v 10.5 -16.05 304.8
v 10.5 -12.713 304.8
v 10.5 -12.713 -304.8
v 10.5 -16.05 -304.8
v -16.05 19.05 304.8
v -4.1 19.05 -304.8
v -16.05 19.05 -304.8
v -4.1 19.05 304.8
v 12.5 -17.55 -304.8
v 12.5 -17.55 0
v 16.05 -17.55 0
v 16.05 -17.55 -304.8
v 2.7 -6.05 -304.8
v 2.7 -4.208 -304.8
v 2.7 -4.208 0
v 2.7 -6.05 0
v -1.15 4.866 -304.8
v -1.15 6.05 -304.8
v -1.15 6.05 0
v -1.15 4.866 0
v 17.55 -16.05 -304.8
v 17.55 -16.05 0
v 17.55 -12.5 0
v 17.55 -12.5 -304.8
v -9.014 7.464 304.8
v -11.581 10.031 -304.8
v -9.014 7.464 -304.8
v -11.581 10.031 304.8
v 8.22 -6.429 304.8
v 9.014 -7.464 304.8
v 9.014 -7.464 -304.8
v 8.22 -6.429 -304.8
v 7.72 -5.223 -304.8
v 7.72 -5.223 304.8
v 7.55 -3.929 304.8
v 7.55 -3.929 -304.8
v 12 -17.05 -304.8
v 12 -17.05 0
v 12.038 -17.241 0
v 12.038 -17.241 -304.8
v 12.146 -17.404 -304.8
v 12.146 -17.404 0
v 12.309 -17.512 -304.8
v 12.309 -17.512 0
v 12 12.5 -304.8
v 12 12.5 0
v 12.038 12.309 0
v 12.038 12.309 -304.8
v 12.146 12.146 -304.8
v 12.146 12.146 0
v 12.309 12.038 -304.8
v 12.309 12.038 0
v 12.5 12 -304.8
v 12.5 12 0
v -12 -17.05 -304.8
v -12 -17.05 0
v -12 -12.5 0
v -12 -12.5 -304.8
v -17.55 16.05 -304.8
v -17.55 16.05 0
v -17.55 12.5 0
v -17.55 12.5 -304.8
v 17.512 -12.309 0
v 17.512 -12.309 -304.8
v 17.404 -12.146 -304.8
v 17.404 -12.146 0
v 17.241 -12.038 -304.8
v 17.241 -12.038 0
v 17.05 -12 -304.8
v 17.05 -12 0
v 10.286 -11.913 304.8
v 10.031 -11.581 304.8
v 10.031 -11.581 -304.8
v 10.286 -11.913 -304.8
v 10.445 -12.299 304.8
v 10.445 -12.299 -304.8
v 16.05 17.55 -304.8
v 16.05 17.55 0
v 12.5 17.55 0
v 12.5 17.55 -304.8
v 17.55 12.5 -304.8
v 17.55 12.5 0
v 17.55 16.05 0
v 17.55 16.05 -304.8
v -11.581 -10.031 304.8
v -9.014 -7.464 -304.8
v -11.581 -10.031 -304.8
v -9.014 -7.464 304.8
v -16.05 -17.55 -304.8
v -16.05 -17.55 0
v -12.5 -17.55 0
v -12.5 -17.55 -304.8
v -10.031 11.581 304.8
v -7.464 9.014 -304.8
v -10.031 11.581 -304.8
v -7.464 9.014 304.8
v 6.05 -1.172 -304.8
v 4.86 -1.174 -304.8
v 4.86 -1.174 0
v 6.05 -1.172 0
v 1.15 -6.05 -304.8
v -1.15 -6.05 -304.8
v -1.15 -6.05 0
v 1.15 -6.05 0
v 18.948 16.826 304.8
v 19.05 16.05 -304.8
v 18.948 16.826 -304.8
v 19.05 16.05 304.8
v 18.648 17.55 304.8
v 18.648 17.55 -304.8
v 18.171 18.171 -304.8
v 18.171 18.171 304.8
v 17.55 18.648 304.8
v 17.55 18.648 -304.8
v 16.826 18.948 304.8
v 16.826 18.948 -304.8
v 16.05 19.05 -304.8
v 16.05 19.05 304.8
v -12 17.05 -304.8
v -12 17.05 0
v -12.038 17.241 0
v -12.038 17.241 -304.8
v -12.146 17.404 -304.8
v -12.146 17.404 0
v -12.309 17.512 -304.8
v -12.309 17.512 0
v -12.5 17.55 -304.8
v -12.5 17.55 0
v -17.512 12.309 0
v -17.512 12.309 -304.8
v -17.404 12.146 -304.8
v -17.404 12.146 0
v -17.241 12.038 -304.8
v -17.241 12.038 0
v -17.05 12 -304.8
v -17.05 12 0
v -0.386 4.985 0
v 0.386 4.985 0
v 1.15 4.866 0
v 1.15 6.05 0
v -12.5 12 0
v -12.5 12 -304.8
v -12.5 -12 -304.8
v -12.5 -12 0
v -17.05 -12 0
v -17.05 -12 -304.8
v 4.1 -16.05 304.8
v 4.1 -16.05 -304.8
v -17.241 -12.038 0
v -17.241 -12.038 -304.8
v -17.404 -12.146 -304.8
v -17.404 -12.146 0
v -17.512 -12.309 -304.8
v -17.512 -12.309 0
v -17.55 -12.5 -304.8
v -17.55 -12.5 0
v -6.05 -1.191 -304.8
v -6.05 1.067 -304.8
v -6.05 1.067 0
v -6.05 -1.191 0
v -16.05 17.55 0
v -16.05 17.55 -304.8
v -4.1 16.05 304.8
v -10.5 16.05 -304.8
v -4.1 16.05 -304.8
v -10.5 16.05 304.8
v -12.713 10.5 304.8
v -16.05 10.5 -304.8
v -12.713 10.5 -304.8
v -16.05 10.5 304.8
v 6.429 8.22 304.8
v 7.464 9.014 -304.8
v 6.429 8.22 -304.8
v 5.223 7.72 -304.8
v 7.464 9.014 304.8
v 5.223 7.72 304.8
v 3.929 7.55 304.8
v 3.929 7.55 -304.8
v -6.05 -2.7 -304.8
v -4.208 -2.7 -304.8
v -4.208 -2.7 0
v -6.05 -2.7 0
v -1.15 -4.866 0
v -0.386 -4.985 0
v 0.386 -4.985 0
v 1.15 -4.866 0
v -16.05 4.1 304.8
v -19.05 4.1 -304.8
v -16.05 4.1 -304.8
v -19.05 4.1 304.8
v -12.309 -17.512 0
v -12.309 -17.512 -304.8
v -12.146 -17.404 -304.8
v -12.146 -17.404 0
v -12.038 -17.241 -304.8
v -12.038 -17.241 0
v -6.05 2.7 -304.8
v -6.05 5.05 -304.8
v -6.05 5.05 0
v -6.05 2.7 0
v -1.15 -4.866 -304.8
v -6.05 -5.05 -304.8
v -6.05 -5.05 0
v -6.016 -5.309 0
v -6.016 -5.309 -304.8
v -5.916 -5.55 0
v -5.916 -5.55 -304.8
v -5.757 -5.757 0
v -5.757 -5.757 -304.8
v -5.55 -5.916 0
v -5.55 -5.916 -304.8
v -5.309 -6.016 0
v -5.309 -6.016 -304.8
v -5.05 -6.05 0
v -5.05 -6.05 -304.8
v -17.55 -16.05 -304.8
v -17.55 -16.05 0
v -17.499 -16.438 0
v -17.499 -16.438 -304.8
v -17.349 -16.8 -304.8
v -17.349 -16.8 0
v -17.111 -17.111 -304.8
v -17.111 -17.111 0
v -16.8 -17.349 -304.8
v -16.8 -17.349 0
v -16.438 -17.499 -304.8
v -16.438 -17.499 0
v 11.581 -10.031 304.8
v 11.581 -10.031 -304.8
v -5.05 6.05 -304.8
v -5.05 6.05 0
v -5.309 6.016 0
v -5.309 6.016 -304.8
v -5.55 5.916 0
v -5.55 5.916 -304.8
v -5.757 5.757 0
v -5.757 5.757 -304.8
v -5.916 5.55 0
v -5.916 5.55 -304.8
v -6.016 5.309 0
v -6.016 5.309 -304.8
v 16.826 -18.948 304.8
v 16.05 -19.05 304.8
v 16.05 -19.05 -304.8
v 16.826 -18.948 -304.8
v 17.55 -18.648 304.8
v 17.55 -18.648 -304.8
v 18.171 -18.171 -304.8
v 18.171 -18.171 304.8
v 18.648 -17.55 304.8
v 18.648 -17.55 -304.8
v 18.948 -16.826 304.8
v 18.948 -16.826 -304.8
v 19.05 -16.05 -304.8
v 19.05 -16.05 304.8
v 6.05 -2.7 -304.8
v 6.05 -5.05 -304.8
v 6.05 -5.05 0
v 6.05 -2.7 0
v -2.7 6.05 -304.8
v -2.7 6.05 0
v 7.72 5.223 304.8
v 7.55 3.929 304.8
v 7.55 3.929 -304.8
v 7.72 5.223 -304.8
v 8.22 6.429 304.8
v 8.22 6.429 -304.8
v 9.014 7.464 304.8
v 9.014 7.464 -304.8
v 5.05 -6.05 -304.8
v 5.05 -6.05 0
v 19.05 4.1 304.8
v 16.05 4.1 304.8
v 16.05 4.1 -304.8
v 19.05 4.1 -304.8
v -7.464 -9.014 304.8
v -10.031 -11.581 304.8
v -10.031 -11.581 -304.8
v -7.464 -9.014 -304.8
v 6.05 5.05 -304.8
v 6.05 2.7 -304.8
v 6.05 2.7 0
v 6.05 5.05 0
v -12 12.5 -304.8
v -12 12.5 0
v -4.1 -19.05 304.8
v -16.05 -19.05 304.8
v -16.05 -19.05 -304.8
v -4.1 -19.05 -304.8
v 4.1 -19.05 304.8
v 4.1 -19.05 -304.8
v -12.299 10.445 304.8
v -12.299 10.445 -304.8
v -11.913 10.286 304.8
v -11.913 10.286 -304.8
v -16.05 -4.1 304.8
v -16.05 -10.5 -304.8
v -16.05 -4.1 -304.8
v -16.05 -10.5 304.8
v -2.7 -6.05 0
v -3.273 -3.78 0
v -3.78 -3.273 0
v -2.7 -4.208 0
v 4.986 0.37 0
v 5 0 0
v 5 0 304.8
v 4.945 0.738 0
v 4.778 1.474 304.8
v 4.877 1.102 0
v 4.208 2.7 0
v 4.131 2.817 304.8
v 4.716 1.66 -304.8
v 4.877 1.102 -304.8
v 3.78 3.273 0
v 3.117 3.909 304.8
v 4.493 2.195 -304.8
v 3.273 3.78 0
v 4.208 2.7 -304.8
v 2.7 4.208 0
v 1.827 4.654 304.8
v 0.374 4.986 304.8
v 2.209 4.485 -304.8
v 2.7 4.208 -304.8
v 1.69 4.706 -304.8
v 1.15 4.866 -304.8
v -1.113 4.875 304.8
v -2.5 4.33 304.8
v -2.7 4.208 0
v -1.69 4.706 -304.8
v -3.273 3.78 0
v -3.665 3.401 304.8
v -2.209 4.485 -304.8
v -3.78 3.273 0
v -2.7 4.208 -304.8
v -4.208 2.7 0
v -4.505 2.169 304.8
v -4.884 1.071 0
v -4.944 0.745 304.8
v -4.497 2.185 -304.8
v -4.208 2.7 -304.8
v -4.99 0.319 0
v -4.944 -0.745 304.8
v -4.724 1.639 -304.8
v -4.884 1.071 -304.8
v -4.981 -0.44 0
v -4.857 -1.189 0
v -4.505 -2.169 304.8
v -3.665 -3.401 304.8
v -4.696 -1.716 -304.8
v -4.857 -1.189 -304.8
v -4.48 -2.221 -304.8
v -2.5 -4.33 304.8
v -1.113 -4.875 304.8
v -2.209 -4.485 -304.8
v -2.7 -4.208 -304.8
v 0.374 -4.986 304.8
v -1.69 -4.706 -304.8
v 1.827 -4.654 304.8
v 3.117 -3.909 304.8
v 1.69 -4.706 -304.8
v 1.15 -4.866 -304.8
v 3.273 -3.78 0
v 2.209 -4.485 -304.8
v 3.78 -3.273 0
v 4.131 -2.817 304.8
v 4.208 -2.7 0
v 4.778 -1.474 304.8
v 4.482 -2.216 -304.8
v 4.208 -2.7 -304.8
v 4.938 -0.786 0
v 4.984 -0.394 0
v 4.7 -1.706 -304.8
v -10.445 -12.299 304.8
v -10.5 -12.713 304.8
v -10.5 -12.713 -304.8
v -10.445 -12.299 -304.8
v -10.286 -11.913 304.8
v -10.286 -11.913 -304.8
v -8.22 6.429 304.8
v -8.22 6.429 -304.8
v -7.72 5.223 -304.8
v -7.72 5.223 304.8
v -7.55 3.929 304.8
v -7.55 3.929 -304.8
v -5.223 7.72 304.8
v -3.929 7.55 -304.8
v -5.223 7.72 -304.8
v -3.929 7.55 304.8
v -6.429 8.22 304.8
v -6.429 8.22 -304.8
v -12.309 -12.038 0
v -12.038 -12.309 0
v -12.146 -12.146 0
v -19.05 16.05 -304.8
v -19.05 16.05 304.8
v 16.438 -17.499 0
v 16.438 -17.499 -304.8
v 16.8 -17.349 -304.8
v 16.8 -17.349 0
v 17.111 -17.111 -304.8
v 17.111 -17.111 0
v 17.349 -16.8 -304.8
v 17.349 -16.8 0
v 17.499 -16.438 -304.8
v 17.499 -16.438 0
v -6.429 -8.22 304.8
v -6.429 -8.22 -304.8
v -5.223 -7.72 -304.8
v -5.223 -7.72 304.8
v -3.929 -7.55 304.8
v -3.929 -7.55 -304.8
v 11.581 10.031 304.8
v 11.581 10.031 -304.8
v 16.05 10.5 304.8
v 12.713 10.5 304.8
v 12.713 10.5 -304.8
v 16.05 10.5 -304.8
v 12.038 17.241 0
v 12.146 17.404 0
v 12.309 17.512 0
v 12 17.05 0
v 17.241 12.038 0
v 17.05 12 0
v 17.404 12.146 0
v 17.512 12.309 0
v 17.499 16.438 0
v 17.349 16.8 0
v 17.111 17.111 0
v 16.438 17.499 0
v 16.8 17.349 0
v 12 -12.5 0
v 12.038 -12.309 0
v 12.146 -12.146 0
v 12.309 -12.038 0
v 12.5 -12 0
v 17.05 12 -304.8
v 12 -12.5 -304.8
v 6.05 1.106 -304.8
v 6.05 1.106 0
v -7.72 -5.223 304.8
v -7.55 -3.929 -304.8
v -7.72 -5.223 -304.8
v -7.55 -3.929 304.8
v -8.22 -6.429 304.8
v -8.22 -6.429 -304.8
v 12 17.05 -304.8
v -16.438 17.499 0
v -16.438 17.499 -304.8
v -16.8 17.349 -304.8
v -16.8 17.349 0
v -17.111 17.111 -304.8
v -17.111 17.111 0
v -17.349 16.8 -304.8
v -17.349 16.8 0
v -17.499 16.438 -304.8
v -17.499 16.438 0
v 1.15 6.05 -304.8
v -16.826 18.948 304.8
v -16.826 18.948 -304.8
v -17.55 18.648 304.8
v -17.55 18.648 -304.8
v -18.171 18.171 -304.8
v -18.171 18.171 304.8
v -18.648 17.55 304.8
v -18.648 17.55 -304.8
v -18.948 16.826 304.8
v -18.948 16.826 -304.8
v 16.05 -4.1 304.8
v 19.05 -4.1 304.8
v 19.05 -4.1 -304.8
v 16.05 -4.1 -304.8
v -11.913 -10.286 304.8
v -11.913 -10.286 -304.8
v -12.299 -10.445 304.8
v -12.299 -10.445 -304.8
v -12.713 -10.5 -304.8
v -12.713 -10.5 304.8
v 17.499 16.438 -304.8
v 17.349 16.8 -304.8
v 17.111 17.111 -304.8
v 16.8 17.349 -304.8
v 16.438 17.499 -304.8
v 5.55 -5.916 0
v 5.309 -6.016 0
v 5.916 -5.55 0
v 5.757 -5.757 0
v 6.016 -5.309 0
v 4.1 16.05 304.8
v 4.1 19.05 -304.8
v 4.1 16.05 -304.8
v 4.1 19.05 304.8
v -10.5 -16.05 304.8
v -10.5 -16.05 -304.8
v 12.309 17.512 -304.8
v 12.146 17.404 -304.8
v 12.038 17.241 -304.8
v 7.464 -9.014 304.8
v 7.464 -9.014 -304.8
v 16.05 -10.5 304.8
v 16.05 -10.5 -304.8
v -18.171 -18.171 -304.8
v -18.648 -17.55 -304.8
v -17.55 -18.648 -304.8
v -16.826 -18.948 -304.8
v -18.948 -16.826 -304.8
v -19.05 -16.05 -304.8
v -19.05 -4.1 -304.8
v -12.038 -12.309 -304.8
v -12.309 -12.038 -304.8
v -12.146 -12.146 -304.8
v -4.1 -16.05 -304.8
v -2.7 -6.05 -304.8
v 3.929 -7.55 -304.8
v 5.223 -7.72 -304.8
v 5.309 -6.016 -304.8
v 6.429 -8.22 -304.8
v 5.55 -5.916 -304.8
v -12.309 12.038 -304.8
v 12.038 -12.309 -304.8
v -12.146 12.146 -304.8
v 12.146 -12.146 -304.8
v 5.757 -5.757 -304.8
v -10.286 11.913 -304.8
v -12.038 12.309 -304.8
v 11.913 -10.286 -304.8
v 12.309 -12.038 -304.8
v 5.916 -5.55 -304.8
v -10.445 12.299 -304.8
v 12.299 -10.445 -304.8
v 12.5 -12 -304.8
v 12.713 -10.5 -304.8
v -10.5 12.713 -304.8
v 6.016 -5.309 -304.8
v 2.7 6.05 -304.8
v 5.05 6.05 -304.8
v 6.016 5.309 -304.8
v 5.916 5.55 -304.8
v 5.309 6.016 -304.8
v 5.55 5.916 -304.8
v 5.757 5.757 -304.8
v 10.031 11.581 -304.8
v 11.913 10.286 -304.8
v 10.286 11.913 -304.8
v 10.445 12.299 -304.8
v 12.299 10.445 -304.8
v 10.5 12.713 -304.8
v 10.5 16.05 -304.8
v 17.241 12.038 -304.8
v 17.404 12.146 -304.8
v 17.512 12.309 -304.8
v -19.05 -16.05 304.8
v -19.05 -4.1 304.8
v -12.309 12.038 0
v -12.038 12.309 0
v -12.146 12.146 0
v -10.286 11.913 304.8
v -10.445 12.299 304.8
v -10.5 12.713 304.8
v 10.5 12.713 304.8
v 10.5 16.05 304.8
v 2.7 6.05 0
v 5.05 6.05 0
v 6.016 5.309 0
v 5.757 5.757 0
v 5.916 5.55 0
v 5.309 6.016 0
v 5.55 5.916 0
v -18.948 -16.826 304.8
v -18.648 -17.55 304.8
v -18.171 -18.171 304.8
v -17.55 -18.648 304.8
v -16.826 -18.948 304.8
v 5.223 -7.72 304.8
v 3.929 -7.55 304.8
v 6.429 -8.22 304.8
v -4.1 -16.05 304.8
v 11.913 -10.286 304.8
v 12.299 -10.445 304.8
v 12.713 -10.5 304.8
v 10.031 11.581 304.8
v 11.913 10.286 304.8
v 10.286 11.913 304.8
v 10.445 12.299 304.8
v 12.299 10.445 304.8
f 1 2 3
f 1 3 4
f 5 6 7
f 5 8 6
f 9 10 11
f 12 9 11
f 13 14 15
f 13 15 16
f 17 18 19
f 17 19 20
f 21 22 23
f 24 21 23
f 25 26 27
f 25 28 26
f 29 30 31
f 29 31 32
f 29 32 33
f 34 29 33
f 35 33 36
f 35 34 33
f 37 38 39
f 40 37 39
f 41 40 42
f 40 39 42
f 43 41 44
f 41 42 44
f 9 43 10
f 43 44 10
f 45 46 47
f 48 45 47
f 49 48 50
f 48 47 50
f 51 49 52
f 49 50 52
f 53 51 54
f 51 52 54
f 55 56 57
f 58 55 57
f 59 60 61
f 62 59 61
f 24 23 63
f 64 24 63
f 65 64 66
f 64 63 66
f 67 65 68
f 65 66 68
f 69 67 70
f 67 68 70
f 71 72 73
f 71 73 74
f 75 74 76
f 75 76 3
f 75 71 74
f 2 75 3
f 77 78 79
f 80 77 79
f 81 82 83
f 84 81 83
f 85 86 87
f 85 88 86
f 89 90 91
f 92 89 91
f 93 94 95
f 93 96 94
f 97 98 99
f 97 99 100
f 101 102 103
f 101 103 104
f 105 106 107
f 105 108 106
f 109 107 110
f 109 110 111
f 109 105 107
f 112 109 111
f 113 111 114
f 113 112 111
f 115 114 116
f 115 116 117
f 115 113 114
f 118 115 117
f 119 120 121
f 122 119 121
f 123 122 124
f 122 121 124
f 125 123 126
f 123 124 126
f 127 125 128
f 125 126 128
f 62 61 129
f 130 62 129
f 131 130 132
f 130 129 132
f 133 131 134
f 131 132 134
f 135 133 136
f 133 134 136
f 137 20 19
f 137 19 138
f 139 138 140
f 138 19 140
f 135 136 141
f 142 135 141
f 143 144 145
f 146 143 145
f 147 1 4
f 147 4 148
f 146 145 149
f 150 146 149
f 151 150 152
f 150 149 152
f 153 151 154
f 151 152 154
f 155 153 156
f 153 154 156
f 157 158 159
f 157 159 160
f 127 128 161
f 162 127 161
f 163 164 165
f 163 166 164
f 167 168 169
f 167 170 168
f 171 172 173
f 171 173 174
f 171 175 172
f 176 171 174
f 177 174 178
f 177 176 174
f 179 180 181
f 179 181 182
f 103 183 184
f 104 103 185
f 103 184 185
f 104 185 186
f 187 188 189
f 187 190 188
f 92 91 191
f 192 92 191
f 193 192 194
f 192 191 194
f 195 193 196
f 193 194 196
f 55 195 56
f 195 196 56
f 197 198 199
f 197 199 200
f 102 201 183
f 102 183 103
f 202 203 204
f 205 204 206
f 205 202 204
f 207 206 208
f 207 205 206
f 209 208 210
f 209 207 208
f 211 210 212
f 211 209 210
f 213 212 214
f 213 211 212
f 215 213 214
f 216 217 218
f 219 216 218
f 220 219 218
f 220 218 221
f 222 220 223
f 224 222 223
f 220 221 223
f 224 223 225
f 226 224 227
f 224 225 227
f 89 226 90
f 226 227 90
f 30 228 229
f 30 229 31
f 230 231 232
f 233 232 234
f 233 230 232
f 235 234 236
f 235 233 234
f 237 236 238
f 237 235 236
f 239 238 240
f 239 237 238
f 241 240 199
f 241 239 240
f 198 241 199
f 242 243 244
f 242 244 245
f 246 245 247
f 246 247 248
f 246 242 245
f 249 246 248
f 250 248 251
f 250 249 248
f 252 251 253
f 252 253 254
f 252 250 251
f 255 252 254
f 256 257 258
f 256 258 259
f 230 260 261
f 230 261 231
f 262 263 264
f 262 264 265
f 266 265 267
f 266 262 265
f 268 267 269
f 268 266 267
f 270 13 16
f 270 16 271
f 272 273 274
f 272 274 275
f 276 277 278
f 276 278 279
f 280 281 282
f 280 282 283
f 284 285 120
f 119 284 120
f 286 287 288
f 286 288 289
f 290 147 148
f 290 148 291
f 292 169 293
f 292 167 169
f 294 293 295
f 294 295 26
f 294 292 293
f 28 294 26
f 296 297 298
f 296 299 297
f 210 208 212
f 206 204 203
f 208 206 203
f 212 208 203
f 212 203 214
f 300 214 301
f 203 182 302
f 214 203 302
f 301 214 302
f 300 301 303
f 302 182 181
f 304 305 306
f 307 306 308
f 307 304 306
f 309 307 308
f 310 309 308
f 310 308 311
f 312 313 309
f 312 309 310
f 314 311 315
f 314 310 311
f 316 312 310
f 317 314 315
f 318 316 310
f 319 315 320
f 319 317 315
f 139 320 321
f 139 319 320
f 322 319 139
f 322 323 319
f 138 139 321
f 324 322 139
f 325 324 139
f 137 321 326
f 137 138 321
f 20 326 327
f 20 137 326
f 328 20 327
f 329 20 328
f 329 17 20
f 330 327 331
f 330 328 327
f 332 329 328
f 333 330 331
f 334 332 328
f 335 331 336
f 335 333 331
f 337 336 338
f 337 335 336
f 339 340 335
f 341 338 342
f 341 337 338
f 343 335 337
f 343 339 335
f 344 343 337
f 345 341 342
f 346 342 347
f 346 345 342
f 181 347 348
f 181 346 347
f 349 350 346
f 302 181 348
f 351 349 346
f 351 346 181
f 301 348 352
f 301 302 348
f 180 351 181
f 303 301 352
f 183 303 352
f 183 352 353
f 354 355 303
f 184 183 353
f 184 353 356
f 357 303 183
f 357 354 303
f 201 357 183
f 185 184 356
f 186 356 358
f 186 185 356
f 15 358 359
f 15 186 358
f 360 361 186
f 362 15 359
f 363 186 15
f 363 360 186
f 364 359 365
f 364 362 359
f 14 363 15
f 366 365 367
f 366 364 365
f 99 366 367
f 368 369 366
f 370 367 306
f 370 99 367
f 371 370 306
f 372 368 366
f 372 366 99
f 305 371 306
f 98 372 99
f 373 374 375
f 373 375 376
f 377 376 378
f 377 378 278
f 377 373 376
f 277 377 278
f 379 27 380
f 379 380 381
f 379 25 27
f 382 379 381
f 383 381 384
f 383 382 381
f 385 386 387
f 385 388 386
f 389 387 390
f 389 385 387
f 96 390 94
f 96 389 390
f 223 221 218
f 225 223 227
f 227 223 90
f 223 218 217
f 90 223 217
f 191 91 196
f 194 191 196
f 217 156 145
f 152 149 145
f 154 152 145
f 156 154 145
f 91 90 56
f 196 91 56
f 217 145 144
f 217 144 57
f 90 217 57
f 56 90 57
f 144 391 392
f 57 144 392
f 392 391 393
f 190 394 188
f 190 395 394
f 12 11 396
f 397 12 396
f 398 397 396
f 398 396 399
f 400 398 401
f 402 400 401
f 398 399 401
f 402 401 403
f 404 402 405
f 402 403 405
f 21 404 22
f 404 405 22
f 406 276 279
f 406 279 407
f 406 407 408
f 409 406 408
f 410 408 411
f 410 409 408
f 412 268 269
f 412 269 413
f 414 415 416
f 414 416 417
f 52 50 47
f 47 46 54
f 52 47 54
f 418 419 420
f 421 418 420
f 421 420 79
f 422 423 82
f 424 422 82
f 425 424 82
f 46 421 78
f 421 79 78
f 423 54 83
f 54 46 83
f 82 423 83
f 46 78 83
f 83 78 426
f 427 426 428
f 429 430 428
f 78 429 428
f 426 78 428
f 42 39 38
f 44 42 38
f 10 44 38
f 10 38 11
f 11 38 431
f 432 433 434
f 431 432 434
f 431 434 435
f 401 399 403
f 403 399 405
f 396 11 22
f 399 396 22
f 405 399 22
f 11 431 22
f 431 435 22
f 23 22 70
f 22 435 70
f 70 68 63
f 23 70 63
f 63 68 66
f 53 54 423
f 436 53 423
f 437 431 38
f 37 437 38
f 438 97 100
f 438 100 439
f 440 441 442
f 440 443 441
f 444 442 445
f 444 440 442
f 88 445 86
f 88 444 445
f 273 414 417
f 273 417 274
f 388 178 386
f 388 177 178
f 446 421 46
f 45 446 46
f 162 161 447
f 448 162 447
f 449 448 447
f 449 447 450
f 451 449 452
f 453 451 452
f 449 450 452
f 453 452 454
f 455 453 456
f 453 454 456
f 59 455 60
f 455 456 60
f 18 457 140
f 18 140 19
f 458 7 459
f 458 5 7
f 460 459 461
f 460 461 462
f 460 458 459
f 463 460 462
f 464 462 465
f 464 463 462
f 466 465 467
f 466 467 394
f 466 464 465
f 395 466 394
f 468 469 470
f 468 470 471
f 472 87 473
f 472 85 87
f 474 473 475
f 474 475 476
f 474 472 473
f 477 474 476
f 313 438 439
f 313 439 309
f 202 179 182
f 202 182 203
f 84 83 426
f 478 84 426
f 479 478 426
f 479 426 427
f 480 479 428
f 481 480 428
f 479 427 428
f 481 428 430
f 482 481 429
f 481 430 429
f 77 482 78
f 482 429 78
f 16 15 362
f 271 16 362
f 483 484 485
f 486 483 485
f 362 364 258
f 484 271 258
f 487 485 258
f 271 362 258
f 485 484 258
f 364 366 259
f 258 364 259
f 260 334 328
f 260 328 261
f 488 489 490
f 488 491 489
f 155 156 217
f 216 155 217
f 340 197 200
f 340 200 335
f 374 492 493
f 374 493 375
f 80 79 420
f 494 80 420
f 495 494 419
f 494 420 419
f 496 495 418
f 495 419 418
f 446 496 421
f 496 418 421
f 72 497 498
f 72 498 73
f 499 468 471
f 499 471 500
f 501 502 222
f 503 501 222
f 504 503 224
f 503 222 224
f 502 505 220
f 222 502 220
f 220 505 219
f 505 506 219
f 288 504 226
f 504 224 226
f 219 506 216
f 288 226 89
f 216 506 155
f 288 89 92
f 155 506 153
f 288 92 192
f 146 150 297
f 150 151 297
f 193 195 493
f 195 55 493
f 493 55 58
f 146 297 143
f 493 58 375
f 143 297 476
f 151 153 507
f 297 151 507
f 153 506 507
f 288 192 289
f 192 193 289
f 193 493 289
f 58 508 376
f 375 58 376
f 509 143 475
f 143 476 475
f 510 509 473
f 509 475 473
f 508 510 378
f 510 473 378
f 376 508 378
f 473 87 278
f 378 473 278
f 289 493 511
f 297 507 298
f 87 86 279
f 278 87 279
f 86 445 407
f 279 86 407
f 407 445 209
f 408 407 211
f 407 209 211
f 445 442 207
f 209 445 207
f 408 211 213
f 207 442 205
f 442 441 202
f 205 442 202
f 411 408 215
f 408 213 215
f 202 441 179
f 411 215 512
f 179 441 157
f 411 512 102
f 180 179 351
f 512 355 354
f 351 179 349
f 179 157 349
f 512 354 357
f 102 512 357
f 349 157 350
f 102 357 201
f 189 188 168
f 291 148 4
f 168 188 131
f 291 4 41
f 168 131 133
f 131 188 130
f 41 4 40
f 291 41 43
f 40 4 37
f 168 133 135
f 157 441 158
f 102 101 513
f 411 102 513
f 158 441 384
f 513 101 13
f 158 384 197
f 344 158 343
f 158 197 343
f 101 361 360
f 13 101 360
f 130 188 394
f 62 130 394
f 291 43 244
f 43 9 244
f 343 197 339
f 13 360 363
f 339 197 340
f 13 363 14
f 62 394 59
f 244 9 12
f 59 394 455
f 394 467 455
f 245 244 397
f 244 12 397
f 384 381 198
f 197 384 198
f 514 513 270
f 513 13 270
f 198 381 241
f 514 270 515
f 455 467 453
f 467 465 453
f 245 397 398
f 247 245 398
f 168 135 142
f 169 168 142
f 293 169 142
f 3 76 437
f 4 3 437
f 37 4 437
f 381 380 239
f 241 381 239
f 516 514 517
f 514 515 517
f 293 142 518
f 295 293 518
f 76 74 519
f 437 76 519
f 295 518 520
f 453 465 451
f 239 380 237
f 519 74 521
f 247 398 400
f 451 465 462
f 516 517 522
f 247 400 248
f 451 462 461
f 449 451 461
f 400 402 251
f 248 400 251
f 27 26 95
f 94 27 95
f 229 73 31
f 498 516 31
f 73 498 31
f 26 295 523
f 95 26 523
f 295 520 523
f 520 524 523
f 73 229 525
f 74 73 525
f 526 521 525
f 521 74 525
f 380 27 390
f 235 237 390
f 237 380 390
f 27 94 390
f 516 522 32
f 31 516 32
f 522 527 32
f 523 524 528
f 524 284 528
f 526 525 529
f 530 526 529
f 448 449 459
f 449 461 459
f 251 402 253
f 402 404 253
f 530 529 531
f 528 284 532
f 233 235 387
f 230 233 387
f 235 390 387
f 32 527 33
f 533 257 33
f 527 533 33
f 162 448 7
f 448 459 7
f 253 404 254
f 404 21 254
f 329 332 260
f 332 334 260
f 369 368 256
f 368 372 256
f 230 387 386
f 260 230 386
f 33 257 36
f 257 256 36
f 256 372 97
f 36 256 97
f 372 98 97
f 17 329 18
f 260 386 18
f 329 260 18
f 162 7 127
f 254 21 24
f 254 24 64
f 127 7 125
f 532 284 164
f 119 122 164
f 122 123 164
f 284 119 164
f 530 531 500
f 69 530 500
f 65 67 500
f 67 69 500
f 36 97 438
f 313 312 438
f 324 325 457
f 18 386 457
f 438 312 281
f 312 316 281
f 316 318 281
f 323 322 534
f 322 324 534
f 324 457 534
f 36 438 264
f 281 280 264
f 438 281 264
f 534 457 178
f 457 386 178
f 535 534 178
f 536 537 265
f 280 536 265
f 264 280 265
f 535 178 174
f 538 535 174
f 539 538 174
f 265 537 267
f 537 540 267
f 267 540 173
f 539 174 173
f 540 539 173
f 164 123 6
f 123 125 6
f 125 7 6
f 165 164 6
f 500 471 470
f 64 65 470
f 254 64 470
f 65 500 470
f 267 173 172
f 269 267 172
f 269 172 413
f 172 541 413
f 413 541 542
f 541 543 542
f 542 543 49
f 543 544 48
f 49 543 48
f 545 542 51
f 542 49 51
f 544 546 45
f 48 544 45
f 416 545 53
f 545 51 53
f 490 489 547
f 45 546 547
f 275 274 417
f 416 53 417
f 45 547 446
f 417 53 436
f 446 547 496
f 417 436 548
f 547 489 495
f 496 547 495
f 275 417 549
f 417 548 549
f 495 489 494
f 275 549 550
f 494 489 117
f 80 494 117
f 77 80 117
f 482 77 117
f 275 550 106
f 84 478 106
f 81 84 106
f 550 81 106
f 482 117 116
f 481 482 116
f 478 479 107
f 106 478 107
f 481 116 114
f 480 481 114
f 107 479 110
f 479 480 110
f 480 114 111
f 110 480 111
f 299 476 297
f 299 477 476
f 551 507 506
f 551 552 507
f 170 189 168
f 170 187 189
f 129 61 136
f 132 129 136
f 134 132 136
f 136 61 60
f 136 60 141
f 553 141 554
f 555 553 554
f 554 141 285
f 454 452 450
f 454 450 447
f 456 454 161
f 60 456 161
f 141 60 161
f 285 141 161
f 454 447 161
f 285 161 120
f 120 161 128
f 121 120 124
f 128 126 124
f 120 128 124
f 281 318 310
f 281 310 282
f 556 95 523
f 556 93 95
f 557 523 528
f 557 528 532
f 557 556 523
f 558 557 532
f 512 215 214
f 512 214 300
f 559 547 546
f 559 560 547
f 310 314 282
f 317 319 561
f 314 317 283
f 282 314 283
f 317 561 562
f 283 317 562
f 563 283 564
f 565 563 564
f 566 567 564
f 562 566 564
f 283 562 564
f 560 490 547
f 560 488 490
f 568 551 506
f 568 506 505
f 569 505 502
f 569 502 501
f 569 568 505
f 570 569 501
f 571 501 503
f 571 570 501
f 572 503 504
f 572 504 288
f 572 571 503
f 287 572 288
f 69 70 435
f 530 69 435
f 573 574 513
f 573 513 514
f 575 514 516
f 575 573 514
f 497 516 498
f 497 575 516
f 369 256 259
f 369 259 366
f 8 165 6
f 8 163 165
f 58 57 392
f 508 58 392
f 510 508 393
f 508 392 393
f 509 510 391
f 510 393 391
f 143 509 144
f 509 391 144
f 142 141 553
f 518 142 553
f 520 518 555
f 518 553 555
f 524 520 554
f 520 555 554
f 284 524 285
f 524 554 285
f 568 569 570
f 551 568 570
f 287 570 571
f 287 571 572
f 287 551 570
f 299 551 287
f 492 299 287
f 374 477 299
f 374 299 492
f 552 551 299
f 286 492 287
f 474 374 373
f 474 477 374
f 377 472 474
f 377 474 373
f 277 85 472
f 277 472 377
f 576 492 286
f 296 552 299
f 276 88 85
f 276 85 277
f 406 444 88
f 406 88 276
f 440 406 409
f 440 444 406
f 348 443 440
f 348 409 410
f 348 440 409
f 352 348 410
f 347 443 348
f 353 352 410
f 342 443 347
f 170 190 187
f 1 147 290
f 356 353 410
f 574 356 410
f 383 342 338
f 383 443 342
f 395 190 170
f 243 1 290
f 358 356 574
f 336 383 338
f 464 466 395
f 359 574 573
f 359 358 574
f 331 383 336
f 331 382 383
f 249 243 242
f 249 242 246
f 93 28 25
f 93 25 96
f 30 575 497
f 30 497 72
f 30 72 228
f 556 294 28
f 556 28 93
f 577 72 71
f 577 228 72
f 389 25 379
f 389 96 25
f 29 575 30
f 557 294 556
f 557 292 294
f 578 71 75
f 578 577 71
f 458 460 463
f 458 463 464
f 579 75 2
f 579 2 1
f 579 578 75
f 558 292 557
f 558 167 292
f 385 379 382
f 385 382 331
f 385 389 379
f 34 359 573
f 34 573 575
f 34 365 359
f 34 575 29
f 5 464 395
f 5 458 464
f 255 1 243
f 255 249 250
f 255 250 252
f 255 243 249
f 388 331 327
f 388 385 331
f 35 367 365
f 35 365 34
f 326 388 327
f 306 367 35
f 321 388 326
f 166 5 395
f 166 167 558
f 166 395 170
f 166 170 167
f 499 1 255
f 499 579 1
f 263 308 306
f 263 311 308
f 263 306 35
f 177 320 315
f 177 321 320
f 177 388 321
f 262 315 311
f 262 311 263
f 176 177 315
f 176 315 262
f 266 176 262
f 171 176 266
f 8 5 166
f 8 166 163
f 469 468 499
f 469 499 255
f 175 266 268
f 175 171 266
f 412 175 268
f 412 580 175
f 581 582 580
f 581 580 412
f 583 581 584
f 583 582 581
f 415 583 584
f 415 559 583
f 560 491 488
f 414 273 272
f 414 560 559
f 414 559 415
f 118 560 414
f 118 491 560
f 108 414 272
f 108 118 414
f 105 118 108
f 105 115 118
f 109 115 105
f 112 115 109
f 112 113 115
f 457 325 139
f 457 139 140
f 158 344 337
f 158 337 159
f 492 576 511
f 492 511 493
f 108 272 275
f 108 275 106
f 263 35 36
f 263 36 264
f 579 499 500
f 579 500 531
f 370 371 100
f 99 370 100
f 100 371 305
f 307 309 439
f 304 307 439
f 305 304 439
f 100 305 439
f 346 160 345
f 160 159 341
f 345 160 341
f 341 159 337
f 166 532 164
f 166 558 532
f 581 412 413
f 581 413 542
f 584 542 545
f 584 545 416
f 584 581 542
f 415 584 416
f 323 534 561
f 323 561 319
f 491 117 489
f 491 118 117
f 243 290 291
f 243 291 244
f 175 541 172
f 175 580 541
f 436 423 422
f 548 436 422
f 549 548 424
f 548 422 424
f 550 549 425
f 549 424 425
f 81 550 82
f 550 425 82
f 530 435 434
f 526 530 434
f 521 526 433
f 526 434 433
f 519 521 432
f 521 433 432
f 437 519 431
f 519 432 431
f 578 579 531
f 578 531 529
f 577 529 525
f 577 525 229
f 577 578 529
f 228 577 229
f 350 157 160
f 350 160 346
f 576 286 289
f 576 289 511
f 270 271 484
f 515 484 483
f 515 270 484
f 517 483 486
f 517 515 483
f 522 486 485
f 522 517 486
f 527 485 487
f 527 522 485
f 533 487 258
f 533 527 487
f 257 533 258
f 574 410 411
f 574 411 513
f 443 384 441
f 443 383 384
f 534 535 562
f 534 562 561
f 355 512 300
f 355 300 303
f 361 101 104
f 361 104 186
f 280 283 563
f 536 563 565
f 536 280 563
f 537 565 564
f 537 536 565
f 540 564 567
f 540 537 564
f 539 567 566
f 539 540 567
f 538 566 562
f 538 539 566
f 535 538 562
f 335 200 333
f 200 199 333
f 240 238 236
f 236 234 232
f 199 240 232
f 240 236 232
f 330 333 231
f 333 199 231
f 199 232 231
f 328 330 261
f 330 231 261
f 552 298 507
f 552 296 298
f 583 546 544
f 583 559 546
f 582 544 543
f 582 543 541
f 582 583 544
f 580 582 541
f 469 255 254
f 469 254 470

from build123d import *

# Parameters (mm, degrees)
SKETCH1_R           = 5
BOSS_EXTRUDE1_DEPTH = 304.8
CUT_EXTRUDE1_DEPTH  = 6000
CUT_EXTRUDE2_DEPTH  = 6000
CUT_EXTRUDE3_START  = -6000
CUT_EXTRUDE3_DEPTH  = 6000
CUT_EXTRUDE4_DEPTH  = 6000
CUT_EXTRUDE5_DEPTH  = 6000


with BuildPart() as part:
    # Sketch1 → Boss-Extrude1 (new, symmetric)
    with BuildSketch(Plane.XY):
        with BuildLine():
            Line((-19.05, -4.1), (-19.05, -16.05))
            ThreePointArc((-19.05, -16.05), (-18.171320344, -18.171320344), (-16.05, -19.05))
            Line((-16.05, -19.05), (-4.1, -19.05))
            Line((-4.1, -19.05), (-4.1, -16.05))
            Line((-4.1, -16.05), (-10.5, -16.05))
            Line((-10.5, -16.05), (-10.5, -12.7127))
            ThreePointArc((-10.5, -12.7127), (-10.378208373, -12.100409218), (-10.03135, -11.58135))
            Line((-10.03135, -11.58135), (-7.464465, -9.014465))
            ThreePointArc((-7.464465, -9.014465), (-5.842347304, -7.930602396), (-3.92893, -7.55))
            Line((-3.92893, -7.55), (3.92893, -7.55))
            ThreePointArc((3.92893, -7.55), (5.842347304, -7.930602396), (7.464465, -9.014465))
            Line((7.464465, -9.014465), (10.03135, -11.58135))
            ThreePointArc((10.03135, -11.58135), (10.378208373, -12.100409218), (10.5, -12.7127))
            Line((10.5, -12.7127), (10.5, -16.05))
            Line((10.5, -16.05), (4.1, -16.05))
            Line((4.1, -16.05), (4.1, -19.05))
            Line((4.1, -19.05), (16.05, -19.05))
            ThreePointArc((16.05, -19.05), (18.171320344, -18.171320344), (19.05, -16.05))
            Line((19.05, -16.05), (19.05, -4.1))
            Line((19.05, -4.1), (16.05, -4.1))
            Line((16.05, -4.1), (16.05, -10.5))
            Line((16.05, -10.5), (12.7127, -10.5))
            ThreePointArc((12.7127, -10.5), (12.100409218, -10.378208373), (11.58135, -10.03135))
            Line((11.58135, -10.03135), (9.014465, -7.464465))
            ThreePointArc((9.014465, -7.464465), (7.930602396, -5.842347304), (7.55, -3.92893))
            Line((7.55, -3.92893), (7.55, 3.92893))
            ThreePointArc((7.55, 3.92893), (7.930602396, 5.842347304), (9.014465, 7.464465))
            Line((9.014465, 7.464465), (11.58135, 10.03135))
            ThreePointArc((11.58135, 10.03135), (12.100409218, 10.378208373), (12.7127, 10.5))
            Line((12.7127, 10.5), (16.05, 10.5))
            Line((16.05, 10.5), (16.05, 4.1))
            Line((16.05, 4.1), (19.05, 4.1))
            Line((19.05, 4.1), (19.05, 16.05))
            ThreePointArc((19.05, 16.05), (18.171320344, 18.171320344), (16.05, 19.05))
            Line((16.05, 19.05), (4.1, 19.05))
            Line((4.1, 19.05), (4.1, 16.05))
            Line((4.1, 16.05), (10.5, 16.05))
            Line((10.5, 16.05), (10.5, 12.7127))
            ThreePointArc((10.5, 12.7127), (10.378208373, 12.100409218), (10.03135, 11.58135))
            Line((10.03135, 11.58135), (7.464465, 9.014465))
            ThreePointArc((7.464465, 9.014465), (5.842347304, 7.930602396), (3.92893, 7.55))
            Line((3.92893, 7.55), (-3.92893, 7.55))
            ThreePointArc((-3.92893, 7.55), (-5.842347304, 7.930602396), (-7.464465, 9.014465))
            Line((-7.464465, 9.014465), (-10.03135, 11.58135))
            ThreePointArc((-10.03135, 11.58135), (-10.378208373, 12.100409218), (-10.5, 12.7127))
            Line((-10.5, 12.7127), (-10.5, 16.05))
            Line((-10.5, 16.05), (-4.1, 16.05))
            Line((-4.1, 16.05), (-4.1, 19.05))
            Line((-4.1, 19.05), (-16.05, 19.05))
            ThreePointArc((-16.05, 19.05), (-18.171320344, 18.171320344), (-19.05, 16.05))
            Line((-19.05, 16.05), (-19.05, 4.1))
            Line((-19.05, 4.1), (-16.05, 4.1))
            Line((-16.05, 4.1), (-16.05, 10.5))
            Line((-16.05, 10.5), (-12.7127, 10.5))
            ThreePointArc((-12.7127, 10.5), (-12.100409218, 10.378208373), (-11.58135, 10.03135))
            Line((-11.58135, 10.03135), (-9.014465, 7.464465))
            ThreePointArc((-9.014465, 7.464465), (-7.930602396, 5.842347304), (-7.55, 3.92893))
            Line((-7.55, 3.92893), (-7.55, -3.92893))
            ThreePointArc((-7.55, -3.92893), (-7.930602396, -5.842347304), (-9.014465, -7.464465))
            Line((-9.014465, -7.464465), (-11.58135, -10.03135))
            ThreePointArc((-11.58135, -10.03135), (-12.100409218, -10.378208373), (-12.7127, -10.5))
            Line((-12.7127, -10.5), (-16.05, -10.5))
            Line((-16.05, -10.5), (-16.05, -4.1))
            Line((-16.05, -4.1), (-19.05, -4.1))
        make_face()
        Circle(SKETCH1_R, mode=Mode.SUBTRACT)
    extrude(amount=BOSS_EXTRUDE1_DEPTH, both=True)

    # Sketch2 → Cut-Extrude1 (cut)
    with BuildSketch(Plane.XY):
        with BuildLine():
            Line((-17.55, -12.5), (-17.55, -16.05))
            ThreePointArc((-17.55, -16.05), (-17.110660172, -17.110660172), (-16.05, -17.55))
            Line((-16.05, -17.55), (-12.5, -17.55))
            ThreePointArc((-12.5, -17.55), (-12.146446609, -17.403553391), (-12, -17.05))
            Line((-12, -17.05), (-12, -12.5))
            ThreePointArc((-12, -12.5), (-12.146446609, -12.146446609), (-12.5, -12))
            Line((-12.5, -12), (-17.05, -12))
            ThreePointArc((-17.05, -12), (-17.403553391, -12.146446609), (-17.55, -12.5))
        make_face()
    extrude(amount=-CUT_EXTRUDE1_DEPTH, mode=Mode.SUBTRACT)

    # Sketch3 → Cut-Extrude2 (cut)
    with BuildSketch(Plane.XY):
        with BuildLine():
            Line((12.5, -17.55), (16.05, -17.55))
            ThreePointArc((16.05, -17.55), (17.110660172, -17.110660172), (17.55, -16.05))
            Line((17.55, -16.05), (17.55, -12.5))
            ThreePointArc((17.55, -12.5), (17.403553391, -12.146446609), (17.05, -12))
            Line((17.05, -12), (12.5, -12))
            ThreePointArc((12.5, -12), (12.146446609, -12.146446609), (12, -12.5))
            Line((12, -12.5), (12, -17.05))
            ThreePointArc((12, -17.05), (12.146446609, -17.403553391), (12.5, -17.55))
        make_face()
    extrude(amount=-CUT_EXTRUDE2_DEPTH, mode=Mode.SUBTRACT)

    # Sketch4 → Cut-Extrude3 (cut)
    with BuildSketch(Plane.XY.offset(CUT_EXTRUDE3_START)):
        with BuildLine():
            Line((-6.05, 1.06724), (-6.05, -1.19102))
            Line((-6.05, -1.19102), (-4.85654377, -1.189110006))
            ThreePointArc((-4.85654377, -1.189110006), (-4.594960171, -1.971380488), (-4.208325083, -2.7))
            Line((-4.208325083, -2.7), (-6.05, -2.7))
            Line((-6.05, -2.7), (-6.05, -5.05))
            ThreePointArc((-6.05, -5.05), (-5.757106781, -5.757106781), (-5.05, -6.05))
            Line((-5.05, -6.05), (-2.7, -6.05))
            Line((-2.7, -6.05), (-2.7, -4.208325083))
            ThreePointArc((-2.7, -4.208325083), (-1.952880863, -4.602853064), (-1.15, -4.865953144))
            Line((-1.15, -4.865953144), (-1.15, -6.05))
            Line((-1.15, -6.05), (1.15, -6.05))
            Line((1.15, -6.05), (1.15, -4.865953144))
            ThreePointArc((1.15, -4.865953144), (1.952880863, -4.602853064), (2.7, -4.208325083))
            Line((2.7, -4.208325083), (2.7, -6.05))
            Line((2.7, -6.05), (5.05, -6.05))
            ThreePointArc((5.05, -6.05), (5.757106781, -5.757106781), (6.05, -5.05))
            Line((6.05, -5.05), (6.05, -2.7))
            Line((6.05, -2.7), (4.208325083, -2.7))
            ThreePointArc((4.208325083, -2.7), (4.598107084, -1.964029338), (4.860322362, -1.173569996))
            Line((4.860322362, -1.173569996), (6.05, -1.17167))
            Line((6.05, -1.17167), (6.05, 1.10628))
            Line((6.05, 1.10628), (4.876934876, 1.102499983))
            ThreePointArc((4.876934876, 1.102499983), (4.612319233, 1.930417389), (4.208325083, 2.7))
            Line((4.208325083, 2.7), (6.05, 2.7))
            Line((6.05, 2.7), (6.05, 5.05))
            ThreePointArc((6.05, 5.05), (5.757106781, 5.757106781), (5.05, 6.05))
            Line((5.05, 6.05), (2.7, 6.05))
            Line((2.7, 6.05), (2.7, 4.208325083))
            ThreePointArc((2.7, 4.208325083), (1.952880863, 4.602853064), (1.15, 4.865953144))
            Line((1.15, 4.865953144), (1.15, 6.05))
            Line((1.15, 6.05), (-1.15, 6.05))
            Line((-1.15, 6.05), (-1.15, 4.865953144))
            ThreePointArc((-1.15, 4.865953144), (-1.952880863, 4.602853064), (-2.7, 4.208325083))
            Line((-2.7, 4.208325083), (-2.7, 6.05))
            Line((-2.7, 6.05), (-5.05, 6.05))
            ThreePointArc((-5.05, 6.05), (-5.757106781, 5.757106781), (-6.05, 5.05))
            Line((-6.05, 5.05), (-6.05, 2.7))
            Line((-6.05, 2.7), (-4.208325083, 2.7))
            ThreePointArc((-4.208325083, 2.7), (-4.618524958, 1.9155227), (-4.883949119, 1.071000003))
            Line((-4.883949119, 1.071000003), (-6.05, 1.06724))
        make_face()
    extrude(amount=CUT_EXTRUDE3_DEPTH, mode=Mode.SUBTRACT)

    # Sketch5 → Cut-Extrude4 (cut)
    with BuildSketch(Plane.XY):
        with BuildLine():
            Line((12, 17.05), (12, 12.5))
            ThreePointArc((12, 12.5), (12.146446609, 12.146446609), (12.5, 12))
            Line((12.5, 12), (17.05, 12))
            ThreePointArc((17.05, 12), (17.403553391, 12.146446609), (17.55, 12.5))
            Line((17.55, 12.5), (17.55, 16.05))
            ThreePointArc((17.55, 16.05), (17.110660172, 17.110660172), (16.05, 17.55))
            Line((16.05, 17.55), (12.5, 17.55))
            ThreePointArc((12.5, 17.55), (12.146446609, 17.403553391), (12, 17.05))
        make_face()
    extrude(amount=-CUT_EXTRUDE4_DEPTH, mode=Mode.SUBTRACT)

    # Sketch6 → Cut-Extrude5 (cut)
    with BuildSketch(Plane.XY):
        with BuildLine():
            Line((-17.05, 12), (-12.5, 12))
            ThreePointArc((-12.5, 12), (-12.146446609, 12.146446609), (-12, 12.5))
            Line((-12, 12.5), (-12, 17.05))
            ThreePointArc((-12, 17.05), (-12.146446609, 17.403553391), (-12.5, 17.55))
            Line((-12.5, 17.55), (-16.05, 17.55))
            ThreePointArc((-16.05, 17.55), (-17.110660172, 17.110660172), (-17.55, 16.05))
            Line((-17.55, 16.05), (-17.55, 12.5))
            ThreePointArc((-17.55, 12.5), (-17.403553391, 12.146446609), (-17.05, 12))
        make_face()
    extrude(amount=-CUT_EXTRUDE5_DEPTH, mode=Mode.SUBTRACT)


solid = part.part
